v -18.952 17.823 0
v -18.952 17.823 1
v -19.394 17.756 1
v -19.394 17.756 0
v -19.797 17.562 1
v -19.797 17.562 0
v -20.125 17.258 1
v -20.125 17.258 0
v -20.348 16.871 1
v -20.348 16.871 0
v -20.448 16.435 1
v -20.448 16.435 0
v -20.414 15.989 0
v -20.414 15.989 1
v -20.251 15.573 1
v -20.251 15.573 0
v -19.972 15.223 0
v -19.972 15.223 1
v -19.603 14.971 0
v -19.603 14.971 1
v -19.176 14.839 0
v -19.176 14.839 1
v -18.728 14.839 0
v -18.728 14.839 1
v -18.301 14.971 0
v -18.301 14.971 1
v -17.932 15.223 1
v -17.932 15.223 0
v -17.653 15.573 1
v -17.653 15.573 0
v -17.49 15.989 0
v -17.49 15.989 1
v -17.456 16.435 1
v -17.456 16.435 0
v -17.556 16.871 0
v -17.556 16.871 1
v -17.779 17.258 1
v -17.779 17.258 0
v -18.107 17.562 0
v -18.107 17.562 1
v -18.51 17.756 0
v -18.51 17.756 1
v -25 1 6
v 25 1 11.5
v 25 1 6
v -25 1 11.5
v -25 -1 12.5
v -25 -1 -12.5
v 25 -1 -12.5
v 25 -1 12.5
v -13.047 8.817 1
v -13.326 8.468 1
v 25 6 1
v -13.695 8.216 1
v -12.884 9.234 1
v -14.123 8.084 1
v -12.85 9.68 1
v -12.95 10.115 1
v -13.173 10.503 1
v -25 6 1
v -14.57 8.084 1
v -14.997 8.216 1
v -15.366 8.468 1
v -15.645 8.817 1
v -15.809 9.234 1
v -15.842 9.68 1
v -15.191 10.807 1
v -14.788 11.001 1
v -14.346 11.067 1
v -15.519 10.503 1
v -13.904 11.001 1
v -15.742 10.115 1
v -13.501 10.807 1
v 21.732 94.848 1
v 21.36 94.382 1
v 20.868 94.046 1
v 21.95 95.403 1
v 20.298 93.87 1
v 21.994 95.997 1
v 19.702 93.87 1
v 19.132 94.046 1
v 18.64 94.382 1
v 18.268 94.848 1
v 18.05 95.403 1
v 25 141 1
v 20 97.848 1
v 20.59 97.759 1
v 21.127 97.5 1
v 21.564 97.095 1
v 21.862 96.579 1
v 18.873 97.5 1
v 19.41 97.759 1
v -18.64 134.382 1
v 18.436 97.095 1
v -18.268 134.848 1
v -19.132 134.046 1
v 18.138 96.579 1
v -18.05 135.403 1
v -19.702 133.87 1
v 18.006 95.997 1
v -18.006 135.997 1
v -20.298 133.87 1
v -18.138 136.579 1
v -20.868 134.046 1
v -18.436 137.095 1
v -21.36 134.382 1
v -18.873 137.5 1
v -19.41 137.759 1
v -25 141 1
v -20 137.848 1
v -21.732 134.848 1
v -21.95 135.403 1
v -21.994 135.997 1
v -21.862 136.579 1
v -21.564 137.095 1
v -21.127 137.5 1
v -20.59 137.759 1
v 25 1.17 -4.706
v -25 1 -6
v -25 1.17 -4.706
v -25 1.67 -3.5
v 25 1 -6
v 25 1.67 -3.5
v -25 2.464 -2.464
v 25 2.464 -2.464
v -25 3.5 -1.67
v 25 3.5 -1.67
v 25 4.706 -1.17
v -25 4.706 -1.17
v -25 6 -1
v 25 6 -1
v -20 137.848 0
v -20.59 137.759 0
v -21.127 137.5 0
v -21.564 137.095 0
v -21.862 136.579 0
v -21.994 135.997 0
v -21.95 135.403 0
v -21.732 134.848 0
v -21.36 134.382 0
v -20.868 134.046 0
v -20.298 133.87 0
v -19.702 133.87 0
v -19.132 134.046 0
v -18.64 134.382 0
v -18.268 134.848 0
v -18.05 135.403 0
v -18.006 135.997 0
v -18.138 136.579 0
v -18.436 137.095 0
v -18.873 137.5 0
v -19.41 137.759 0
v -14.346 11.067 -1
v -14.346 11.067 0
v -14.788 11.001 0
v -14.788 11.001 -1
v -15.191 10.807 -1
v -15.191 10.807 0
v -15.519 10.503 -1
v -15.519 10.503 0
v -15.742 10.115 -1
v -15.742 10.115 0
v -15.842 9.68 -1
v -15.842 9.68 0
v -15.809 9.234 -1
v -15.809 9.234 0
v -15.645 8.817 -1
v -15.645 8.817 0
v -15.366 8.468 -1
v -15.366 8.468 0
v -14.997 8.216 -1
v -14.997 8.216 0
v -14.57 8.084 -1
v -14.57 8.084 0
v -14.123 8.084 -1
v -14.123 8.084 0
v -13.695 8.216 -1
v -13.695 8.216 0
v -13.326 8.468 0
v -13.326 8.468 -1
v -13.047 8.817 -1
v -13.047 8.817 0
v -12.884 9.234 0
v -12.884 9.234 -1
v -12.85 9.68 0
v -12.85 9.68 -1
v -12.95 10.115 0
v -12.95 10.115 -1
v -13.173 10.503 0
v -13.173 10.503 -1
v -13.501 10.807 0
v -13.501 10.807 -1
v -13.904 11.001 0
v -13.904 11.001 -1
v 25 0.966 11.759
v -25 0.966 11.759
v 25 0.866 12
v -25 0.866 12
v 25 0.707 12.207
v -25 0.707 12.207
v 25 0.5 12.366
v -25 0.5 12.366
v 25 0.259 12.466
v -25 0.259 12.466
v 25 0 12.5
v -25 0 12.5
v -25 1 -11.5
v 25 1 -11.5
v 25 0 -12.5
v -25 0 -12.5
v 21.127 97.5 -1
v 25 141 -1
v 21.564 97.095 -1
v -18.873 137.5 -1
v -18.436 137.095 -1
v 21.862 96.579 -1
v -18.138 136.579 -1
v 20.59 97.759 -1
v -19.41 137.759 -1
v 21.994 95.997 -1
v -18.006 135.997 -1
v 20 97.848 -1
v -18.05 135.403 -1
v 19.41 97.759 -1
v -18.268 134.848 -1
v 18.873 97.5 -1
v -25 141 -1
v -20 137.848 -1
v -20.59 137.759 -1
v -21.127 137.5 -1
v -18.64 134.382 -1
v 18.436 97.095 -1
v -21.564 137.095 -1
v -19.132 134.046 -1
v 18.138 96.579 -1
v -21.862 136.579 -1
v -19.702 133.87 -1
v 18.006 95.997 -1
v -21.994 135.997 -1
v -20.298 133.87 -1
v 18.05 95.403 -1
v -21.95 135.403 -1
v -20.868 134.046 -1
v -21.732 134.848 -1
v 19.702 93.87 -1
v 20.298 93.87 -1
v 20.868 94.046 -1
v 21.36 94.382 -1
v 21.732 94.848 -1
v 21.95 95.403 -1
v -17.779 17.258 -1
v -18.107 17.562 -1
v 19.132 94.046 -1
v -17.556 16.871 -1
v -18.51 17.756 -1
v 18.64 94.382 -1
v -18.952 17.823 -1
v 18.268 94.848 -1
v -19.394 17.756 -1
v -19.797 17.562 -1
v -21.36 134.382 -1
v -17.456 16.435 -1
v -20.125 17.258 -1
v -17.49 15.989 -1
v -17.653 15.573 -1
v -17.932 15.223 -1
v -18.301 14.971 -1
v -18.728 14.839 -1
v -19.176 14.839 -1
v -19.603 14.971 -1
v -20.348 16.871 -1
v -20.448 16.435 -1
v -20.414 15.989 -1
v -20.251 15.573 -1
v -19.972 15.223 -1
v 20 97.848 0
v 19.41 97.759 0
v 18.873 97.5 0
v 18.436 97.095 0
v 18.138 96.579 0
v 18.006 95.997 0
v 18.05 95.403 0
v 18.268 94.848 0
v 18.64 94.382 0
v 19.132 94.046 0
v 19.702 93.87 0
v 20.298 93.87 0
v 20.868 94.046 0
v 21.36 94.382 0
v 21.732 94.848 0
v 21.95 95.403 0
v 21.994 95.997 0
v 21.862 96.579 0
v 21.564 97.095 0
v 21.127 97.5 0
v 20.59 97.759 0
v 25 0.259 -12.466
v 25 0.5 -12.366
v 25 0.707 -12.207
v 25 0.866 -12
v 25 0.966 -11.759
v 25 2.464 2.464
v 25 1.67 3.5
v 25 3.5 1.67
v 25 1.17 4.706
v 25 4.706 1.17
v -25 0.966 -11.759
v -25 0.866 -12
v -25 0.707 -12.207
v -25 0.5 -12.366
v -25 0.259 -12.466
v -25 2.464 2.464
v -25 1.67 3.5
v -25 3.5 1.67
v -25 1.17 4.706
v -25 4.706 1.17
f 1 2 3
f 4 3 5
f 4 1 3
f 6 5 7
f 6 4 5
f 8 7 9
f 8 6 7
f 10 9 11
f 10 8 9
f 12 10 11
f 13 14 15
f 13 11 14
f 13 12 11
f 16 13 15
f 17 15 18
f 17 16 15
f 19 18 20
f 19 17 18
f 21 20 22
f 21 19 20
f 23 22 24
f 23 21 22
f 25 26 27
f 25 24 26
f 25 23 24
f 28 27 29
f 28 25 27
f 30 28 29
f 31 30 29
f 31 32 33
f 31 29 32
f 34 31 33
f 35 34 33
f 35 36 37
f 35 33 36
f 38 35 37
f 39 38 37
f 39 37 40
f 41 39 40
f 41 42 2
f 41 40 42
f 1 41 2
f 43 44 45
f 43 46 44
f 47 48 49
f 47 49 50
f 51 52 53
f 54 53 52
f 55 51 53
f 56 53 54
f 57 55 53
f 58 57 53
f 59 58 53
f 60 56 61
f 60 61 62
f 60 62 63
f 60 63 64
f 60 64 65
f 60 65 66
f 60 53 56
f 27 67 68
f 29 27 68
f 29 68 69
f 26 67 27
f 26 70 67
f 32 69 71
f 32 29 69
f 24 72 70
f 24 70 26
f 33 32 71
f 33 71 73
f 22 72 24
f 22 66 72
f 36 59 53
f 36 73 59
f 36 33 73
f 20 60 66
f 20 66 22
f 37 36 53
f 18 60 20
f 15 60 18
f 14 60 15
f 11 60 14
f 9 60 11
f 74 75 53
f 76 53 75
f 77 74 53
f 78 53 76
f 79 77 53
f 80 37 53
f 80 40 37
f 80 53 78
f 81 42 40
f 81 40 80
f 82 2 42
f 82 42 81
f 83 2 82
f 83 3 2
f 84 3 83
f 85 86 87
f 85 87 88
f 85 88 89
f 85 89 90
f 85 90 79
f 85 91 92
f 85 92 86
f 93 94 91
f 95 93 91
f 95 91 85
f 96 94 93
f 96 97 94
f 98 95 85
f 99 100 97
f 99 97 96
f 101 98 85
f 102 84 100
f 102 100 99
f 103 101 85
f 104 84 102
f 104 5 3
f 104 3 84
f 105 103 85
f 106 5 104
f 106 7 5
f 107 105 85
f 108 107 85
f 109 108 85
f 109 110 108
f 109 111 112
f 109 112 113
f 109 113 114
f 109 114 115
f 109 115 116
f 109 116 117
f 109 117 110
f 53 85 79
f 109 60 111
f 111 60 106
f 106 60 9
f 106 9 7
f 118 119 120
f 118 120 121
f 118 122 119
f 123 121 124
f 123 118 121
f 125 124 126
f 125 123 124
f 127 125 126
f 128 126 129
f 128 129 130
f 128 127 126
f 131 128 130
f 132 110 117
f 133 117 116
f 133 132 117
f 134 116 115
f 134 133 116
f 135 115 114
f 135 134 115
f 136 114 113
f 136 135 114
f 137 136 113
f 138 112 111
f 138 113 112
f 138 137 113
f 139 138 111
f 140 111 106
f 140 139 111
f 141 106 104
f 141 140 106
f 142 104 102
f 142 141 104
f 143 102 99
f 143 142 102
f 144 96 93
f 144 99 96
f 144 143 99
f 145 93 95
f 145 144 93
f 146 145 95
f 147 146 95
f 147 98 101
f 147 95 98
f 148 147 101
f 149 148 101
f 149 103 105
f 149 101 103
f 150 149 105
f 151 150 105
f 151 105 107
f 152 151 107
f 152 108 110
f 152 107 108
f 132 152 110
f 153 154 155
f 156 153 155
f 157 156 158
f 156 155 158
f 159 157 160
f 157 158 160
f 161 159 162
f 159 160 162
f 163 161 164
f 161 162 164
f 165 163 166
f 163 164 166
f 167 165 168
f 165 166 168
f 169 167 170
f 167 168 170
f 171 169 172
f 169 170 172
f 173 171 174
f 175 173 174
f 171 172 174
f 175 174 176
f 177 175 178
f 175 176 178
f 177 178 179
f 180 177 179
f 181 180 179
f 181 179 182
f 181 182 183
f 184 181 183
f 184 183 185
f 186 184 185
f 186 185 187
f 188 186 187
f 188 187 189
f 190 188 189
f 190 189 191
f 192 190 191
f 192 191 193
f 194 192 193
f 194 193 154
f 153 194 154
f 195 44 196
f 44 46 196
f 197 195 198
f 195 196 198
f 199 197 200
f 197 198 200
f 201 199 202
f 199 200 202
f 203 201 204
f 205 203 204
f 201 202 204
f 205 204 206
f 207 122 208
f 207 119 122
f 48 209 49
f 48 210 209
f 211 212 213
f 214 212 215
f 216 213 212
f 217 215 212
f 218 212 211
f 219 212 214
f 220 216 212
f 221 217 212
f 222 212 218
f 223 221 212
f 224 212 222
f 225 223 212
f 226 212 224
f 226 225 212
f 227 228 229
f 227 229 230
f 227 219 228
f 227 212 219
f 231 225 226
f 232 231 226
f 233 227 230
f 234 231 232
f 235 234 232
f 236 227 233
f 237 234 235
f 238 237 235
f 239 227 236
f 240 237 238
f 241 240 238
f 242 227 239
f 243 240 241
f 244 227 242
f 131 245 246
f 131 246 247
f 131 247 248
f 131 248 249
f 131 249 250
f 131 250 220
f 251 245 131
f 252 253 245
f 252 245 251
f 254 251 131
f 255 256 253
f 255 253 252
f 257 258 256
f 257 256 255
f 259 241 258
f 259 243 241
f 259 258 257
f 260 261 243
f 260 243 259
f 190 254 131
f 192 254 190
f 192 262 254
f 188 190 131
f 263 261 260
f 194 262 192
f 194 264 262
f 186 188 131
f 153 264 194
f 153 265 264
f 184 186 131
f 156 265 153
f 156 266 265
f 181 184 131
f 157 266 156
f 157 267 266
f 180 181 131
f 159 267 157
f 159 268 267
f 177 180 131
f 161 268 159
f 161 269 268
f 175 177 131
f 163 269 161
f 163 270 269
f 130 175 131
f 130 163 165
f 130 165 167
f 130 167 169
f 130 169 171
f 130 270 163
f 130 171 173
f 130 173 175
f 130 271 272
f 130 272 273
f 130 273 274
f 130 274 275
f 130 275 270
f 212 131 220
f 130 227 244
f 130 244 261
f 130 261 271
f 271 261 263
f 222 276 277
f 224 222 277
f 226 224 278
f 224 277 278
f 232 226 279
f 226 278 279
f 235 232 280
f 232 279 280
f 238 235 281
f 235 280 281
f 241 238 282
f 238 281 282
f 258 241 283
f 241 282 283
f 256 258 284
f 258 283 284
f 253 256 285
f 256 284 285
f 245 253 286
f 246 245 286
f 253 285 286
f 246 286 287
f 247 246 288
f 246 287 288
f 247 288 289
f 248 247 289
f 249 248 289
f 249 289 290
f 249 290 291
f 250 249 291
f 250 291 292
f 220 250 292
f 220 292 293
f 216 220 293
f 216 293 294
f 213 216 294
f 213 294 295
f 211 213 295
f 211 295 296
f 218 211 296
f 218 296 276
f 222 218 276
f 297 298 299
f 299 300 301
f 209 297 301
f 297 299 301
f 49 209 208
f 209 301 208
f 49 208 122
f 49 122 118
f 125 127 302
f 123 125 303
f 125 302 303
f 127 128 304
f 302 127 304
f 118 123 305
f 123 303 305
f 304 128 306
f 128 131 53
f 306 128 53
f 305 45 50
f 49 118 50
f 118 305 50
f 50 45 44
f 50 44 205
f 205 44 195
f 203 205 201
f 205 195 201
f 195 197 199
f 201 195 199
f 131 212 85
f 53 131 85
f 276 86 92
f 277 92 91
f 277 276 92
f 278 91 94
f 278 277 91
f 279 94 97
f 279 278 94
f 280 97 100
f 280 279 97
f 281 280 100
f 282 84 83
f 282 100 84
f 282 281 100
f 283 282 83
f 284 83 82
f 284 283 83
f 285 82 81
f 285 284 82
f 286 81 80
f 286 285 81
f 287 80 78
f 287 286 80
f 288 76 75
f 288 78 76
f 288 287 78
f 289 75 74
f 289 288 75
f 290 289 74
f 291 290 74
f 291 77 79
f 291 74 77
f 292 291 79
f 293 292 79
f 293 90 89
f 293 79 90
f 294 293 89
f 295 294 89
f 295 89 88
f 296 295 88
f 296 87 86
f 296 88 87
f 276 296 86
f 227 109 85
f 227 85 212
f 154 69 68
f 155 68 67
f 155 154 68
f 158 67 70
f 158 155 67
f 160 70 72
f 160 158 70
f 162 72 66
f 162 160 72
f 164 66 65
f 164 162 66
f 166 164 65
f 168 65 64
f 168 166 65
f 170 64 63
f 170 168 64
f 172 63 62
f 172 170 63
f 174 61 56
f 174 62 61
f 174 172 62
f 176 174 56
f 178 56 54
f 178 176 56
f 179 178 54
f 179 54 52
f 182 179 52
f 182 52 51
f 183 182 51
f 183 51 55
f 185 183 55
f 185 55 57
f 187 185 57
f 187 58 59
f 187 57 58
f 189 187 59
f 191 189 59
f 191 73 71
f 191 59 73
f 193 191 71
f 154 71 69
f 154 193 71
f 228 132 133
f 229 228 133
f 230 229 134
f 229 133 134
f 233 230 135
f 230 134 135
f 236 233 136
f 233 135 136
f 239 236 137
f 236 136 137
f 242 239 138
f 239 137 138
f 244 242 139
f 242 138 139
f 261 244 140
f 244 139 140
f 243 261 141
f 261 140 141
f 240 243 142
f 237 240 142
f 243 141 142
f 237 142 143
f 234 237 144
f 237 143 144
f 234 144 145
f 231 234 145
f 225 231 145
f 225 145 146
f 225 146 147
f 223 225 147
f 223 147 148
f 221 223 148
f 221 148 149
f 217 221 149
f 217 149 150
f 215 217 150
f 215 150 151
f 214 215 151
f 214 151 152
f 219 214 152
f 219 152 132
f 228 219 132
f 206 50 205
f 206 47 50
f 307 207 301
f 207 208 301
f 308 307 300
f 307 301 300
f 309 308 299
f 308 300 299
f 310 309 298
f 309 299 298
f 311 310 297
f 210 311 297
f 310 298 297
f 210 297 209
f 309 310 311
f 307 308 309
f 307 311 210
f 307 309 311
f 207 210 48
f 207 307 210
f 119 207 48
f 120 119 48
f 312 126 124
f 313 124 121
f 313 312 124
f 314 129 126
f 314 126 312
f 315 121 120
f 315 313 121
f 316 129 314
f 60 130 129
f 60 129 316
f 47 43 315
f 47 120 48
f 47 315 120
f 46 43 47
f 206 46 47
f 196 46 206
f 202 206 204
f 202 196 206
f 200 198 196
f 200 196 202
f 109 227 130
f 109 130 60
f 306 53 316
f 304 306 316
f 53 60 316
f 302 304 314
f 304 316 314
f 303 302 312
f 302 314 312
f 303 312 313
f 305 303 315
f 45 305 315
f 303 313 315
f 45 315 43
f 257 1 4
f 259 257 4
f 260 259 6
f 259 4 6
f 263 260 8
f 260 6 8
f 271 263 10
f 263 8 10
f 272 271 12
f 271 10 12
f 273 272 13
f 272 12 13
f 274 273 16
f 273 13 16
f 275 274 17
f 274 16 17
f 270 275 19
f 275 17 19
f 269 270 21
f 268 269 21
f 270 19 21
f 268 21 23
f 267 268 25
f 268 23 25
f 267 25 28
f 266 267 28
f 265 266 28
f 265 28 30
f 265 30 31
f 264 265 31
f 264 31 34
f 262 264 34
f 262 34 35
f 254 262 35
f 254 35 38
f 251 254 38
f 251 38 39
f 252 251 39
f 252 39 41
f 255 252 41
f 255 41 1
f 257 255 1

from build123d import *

# Parameters (mm, degrees)
PAD_DEPTH            = 25
FILLET_R             = 5
SKETCH001_R          = 2
SKETCH001_R_2        = 1.5
POCKET_DEPTH         = 12.501
POCKET_DEPTH_BACK    = -12.501
FILLET001_R          = 1
BODY_PLACEMENT_ANGLE = 270


with BuildPart() as part:
    # Sketch → Pad (new body, symmetric)
    with BuildSketch(Plane.XY):
        Polygon((-12.5, 1), (-12.5, -1), (12.5, -1), (12.5, 1), (1, 1), (1, 141), (-1, 141), (-1, 1), align=None)
    extrude(amount=PAD_DEPTH, both=True)

    # Fillet
    fillet_edges = [part.edges().sort_by_distance(p)[0] for p in [
        (-1, 1, 0),
        (1, 1, 0),
    ]]
    fillet(fillet_edges, radius=FILLET_R)

    # Sketch001 → Pocket (cut, two sides)
    with BuildSketch(Plane.YZ) as pocket_sk:
        with Locations((135.847954, 20)):
            Circle(SKETCH001_R)
        with Locations((95.847954, -20)):
            Circle(SKETCH001_R)
        with Locations((9.567412, 14.346174)):
            Circle(SKETCH001_R_2)
        with Locations((16.322672, 18.952028)):
            Circle(SKETCH001_R_2)
    extrude(amount=-POCKET_DEPTH, mode=Mode.SUBTRACT)
    extrude(pocket_sk.sketch, amount=-POCKET_DEPTH_BACK, mode=Mode.SUBTRACT)

    # Fillet001
    fillet001_edges = [part.edges().sort_by_distance(p)[0] for p in [
        (-12.5, 1, 0),
        (12.5, 1, 0),
    ]]
    fillet(fillet001_edges, radius=FILLET001_R)


with BuildPart() as part_1:
    # Body placement: moved
    add(part.part.rotate(Axis((0, 0, 0), (0, 1, 0)), BODY_PLACEMENT_ANGLE))


solid = part_1.part
